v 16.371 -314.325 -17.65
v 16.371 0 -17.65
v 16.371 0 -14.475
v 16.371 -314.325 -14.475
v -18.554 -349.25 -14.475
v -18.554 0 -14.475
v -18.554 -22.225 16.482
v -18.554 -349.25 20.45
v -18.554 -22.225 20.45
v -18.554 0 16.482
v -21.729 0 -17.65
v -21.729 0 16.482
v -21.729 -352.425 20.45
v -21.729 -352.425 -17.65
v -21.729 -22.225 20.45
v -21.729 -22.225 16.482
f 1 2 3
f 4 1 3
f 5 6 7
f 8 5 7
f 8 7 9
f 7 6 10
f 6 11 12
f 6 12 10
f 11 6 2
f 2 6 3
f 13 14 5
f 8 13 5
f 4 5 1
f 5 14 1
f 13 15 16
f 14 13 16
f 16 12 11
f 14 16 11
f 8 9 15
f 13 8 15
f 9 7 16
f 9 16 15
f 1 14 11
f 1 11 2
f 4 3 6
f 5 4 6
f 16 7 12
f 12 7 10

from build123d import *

# Parameters (mm, degrees)
F1_DEPTH = 352.425
F2_W     = 22.225
F2_H     = 3.96875
F3_DEPTH = 25.4
F5_DEPTH = 38.1


with BuildPart() as f1:
    # F0 (on Front) → F1 (new body)
    with BuildSketch(Plane.XZ):
        Polygon((-18.553972, 20.450408), (-21.728972, 20.450408), (-21.728972, -17.649592), (16.371028, -17.649592), (16.371028, -14.474592), (-18.553972, -14.474592), align=None)
    extrude(amount=F1_DEPTH)

    # F2 (on face) → F3 (cut)
    with BuildSketch(Plane.YZ.offset(-18.553972)):
        with Locations((-11.1125, 18.466033)):
            Rectangle(F2_W, F2_H)
    extrude(amount=-F3_DEPTH, mode=Mode.SUBTRACT)

    # F4 (on face) → F5 (cut)
    with BuildSketch(Plane(origin=(0, 0, -17.649592), x_dir=(1, 0, 0), z_dir=(0, 0, -1))):
        Polygon((16.371028, 352.425), (-21.728972, 352.425), (16.371028, 314.325), align=None)
    extrude(amount=-F5_DEPTH, mode=Mode.SUBTRACT)


solid = f1.part
